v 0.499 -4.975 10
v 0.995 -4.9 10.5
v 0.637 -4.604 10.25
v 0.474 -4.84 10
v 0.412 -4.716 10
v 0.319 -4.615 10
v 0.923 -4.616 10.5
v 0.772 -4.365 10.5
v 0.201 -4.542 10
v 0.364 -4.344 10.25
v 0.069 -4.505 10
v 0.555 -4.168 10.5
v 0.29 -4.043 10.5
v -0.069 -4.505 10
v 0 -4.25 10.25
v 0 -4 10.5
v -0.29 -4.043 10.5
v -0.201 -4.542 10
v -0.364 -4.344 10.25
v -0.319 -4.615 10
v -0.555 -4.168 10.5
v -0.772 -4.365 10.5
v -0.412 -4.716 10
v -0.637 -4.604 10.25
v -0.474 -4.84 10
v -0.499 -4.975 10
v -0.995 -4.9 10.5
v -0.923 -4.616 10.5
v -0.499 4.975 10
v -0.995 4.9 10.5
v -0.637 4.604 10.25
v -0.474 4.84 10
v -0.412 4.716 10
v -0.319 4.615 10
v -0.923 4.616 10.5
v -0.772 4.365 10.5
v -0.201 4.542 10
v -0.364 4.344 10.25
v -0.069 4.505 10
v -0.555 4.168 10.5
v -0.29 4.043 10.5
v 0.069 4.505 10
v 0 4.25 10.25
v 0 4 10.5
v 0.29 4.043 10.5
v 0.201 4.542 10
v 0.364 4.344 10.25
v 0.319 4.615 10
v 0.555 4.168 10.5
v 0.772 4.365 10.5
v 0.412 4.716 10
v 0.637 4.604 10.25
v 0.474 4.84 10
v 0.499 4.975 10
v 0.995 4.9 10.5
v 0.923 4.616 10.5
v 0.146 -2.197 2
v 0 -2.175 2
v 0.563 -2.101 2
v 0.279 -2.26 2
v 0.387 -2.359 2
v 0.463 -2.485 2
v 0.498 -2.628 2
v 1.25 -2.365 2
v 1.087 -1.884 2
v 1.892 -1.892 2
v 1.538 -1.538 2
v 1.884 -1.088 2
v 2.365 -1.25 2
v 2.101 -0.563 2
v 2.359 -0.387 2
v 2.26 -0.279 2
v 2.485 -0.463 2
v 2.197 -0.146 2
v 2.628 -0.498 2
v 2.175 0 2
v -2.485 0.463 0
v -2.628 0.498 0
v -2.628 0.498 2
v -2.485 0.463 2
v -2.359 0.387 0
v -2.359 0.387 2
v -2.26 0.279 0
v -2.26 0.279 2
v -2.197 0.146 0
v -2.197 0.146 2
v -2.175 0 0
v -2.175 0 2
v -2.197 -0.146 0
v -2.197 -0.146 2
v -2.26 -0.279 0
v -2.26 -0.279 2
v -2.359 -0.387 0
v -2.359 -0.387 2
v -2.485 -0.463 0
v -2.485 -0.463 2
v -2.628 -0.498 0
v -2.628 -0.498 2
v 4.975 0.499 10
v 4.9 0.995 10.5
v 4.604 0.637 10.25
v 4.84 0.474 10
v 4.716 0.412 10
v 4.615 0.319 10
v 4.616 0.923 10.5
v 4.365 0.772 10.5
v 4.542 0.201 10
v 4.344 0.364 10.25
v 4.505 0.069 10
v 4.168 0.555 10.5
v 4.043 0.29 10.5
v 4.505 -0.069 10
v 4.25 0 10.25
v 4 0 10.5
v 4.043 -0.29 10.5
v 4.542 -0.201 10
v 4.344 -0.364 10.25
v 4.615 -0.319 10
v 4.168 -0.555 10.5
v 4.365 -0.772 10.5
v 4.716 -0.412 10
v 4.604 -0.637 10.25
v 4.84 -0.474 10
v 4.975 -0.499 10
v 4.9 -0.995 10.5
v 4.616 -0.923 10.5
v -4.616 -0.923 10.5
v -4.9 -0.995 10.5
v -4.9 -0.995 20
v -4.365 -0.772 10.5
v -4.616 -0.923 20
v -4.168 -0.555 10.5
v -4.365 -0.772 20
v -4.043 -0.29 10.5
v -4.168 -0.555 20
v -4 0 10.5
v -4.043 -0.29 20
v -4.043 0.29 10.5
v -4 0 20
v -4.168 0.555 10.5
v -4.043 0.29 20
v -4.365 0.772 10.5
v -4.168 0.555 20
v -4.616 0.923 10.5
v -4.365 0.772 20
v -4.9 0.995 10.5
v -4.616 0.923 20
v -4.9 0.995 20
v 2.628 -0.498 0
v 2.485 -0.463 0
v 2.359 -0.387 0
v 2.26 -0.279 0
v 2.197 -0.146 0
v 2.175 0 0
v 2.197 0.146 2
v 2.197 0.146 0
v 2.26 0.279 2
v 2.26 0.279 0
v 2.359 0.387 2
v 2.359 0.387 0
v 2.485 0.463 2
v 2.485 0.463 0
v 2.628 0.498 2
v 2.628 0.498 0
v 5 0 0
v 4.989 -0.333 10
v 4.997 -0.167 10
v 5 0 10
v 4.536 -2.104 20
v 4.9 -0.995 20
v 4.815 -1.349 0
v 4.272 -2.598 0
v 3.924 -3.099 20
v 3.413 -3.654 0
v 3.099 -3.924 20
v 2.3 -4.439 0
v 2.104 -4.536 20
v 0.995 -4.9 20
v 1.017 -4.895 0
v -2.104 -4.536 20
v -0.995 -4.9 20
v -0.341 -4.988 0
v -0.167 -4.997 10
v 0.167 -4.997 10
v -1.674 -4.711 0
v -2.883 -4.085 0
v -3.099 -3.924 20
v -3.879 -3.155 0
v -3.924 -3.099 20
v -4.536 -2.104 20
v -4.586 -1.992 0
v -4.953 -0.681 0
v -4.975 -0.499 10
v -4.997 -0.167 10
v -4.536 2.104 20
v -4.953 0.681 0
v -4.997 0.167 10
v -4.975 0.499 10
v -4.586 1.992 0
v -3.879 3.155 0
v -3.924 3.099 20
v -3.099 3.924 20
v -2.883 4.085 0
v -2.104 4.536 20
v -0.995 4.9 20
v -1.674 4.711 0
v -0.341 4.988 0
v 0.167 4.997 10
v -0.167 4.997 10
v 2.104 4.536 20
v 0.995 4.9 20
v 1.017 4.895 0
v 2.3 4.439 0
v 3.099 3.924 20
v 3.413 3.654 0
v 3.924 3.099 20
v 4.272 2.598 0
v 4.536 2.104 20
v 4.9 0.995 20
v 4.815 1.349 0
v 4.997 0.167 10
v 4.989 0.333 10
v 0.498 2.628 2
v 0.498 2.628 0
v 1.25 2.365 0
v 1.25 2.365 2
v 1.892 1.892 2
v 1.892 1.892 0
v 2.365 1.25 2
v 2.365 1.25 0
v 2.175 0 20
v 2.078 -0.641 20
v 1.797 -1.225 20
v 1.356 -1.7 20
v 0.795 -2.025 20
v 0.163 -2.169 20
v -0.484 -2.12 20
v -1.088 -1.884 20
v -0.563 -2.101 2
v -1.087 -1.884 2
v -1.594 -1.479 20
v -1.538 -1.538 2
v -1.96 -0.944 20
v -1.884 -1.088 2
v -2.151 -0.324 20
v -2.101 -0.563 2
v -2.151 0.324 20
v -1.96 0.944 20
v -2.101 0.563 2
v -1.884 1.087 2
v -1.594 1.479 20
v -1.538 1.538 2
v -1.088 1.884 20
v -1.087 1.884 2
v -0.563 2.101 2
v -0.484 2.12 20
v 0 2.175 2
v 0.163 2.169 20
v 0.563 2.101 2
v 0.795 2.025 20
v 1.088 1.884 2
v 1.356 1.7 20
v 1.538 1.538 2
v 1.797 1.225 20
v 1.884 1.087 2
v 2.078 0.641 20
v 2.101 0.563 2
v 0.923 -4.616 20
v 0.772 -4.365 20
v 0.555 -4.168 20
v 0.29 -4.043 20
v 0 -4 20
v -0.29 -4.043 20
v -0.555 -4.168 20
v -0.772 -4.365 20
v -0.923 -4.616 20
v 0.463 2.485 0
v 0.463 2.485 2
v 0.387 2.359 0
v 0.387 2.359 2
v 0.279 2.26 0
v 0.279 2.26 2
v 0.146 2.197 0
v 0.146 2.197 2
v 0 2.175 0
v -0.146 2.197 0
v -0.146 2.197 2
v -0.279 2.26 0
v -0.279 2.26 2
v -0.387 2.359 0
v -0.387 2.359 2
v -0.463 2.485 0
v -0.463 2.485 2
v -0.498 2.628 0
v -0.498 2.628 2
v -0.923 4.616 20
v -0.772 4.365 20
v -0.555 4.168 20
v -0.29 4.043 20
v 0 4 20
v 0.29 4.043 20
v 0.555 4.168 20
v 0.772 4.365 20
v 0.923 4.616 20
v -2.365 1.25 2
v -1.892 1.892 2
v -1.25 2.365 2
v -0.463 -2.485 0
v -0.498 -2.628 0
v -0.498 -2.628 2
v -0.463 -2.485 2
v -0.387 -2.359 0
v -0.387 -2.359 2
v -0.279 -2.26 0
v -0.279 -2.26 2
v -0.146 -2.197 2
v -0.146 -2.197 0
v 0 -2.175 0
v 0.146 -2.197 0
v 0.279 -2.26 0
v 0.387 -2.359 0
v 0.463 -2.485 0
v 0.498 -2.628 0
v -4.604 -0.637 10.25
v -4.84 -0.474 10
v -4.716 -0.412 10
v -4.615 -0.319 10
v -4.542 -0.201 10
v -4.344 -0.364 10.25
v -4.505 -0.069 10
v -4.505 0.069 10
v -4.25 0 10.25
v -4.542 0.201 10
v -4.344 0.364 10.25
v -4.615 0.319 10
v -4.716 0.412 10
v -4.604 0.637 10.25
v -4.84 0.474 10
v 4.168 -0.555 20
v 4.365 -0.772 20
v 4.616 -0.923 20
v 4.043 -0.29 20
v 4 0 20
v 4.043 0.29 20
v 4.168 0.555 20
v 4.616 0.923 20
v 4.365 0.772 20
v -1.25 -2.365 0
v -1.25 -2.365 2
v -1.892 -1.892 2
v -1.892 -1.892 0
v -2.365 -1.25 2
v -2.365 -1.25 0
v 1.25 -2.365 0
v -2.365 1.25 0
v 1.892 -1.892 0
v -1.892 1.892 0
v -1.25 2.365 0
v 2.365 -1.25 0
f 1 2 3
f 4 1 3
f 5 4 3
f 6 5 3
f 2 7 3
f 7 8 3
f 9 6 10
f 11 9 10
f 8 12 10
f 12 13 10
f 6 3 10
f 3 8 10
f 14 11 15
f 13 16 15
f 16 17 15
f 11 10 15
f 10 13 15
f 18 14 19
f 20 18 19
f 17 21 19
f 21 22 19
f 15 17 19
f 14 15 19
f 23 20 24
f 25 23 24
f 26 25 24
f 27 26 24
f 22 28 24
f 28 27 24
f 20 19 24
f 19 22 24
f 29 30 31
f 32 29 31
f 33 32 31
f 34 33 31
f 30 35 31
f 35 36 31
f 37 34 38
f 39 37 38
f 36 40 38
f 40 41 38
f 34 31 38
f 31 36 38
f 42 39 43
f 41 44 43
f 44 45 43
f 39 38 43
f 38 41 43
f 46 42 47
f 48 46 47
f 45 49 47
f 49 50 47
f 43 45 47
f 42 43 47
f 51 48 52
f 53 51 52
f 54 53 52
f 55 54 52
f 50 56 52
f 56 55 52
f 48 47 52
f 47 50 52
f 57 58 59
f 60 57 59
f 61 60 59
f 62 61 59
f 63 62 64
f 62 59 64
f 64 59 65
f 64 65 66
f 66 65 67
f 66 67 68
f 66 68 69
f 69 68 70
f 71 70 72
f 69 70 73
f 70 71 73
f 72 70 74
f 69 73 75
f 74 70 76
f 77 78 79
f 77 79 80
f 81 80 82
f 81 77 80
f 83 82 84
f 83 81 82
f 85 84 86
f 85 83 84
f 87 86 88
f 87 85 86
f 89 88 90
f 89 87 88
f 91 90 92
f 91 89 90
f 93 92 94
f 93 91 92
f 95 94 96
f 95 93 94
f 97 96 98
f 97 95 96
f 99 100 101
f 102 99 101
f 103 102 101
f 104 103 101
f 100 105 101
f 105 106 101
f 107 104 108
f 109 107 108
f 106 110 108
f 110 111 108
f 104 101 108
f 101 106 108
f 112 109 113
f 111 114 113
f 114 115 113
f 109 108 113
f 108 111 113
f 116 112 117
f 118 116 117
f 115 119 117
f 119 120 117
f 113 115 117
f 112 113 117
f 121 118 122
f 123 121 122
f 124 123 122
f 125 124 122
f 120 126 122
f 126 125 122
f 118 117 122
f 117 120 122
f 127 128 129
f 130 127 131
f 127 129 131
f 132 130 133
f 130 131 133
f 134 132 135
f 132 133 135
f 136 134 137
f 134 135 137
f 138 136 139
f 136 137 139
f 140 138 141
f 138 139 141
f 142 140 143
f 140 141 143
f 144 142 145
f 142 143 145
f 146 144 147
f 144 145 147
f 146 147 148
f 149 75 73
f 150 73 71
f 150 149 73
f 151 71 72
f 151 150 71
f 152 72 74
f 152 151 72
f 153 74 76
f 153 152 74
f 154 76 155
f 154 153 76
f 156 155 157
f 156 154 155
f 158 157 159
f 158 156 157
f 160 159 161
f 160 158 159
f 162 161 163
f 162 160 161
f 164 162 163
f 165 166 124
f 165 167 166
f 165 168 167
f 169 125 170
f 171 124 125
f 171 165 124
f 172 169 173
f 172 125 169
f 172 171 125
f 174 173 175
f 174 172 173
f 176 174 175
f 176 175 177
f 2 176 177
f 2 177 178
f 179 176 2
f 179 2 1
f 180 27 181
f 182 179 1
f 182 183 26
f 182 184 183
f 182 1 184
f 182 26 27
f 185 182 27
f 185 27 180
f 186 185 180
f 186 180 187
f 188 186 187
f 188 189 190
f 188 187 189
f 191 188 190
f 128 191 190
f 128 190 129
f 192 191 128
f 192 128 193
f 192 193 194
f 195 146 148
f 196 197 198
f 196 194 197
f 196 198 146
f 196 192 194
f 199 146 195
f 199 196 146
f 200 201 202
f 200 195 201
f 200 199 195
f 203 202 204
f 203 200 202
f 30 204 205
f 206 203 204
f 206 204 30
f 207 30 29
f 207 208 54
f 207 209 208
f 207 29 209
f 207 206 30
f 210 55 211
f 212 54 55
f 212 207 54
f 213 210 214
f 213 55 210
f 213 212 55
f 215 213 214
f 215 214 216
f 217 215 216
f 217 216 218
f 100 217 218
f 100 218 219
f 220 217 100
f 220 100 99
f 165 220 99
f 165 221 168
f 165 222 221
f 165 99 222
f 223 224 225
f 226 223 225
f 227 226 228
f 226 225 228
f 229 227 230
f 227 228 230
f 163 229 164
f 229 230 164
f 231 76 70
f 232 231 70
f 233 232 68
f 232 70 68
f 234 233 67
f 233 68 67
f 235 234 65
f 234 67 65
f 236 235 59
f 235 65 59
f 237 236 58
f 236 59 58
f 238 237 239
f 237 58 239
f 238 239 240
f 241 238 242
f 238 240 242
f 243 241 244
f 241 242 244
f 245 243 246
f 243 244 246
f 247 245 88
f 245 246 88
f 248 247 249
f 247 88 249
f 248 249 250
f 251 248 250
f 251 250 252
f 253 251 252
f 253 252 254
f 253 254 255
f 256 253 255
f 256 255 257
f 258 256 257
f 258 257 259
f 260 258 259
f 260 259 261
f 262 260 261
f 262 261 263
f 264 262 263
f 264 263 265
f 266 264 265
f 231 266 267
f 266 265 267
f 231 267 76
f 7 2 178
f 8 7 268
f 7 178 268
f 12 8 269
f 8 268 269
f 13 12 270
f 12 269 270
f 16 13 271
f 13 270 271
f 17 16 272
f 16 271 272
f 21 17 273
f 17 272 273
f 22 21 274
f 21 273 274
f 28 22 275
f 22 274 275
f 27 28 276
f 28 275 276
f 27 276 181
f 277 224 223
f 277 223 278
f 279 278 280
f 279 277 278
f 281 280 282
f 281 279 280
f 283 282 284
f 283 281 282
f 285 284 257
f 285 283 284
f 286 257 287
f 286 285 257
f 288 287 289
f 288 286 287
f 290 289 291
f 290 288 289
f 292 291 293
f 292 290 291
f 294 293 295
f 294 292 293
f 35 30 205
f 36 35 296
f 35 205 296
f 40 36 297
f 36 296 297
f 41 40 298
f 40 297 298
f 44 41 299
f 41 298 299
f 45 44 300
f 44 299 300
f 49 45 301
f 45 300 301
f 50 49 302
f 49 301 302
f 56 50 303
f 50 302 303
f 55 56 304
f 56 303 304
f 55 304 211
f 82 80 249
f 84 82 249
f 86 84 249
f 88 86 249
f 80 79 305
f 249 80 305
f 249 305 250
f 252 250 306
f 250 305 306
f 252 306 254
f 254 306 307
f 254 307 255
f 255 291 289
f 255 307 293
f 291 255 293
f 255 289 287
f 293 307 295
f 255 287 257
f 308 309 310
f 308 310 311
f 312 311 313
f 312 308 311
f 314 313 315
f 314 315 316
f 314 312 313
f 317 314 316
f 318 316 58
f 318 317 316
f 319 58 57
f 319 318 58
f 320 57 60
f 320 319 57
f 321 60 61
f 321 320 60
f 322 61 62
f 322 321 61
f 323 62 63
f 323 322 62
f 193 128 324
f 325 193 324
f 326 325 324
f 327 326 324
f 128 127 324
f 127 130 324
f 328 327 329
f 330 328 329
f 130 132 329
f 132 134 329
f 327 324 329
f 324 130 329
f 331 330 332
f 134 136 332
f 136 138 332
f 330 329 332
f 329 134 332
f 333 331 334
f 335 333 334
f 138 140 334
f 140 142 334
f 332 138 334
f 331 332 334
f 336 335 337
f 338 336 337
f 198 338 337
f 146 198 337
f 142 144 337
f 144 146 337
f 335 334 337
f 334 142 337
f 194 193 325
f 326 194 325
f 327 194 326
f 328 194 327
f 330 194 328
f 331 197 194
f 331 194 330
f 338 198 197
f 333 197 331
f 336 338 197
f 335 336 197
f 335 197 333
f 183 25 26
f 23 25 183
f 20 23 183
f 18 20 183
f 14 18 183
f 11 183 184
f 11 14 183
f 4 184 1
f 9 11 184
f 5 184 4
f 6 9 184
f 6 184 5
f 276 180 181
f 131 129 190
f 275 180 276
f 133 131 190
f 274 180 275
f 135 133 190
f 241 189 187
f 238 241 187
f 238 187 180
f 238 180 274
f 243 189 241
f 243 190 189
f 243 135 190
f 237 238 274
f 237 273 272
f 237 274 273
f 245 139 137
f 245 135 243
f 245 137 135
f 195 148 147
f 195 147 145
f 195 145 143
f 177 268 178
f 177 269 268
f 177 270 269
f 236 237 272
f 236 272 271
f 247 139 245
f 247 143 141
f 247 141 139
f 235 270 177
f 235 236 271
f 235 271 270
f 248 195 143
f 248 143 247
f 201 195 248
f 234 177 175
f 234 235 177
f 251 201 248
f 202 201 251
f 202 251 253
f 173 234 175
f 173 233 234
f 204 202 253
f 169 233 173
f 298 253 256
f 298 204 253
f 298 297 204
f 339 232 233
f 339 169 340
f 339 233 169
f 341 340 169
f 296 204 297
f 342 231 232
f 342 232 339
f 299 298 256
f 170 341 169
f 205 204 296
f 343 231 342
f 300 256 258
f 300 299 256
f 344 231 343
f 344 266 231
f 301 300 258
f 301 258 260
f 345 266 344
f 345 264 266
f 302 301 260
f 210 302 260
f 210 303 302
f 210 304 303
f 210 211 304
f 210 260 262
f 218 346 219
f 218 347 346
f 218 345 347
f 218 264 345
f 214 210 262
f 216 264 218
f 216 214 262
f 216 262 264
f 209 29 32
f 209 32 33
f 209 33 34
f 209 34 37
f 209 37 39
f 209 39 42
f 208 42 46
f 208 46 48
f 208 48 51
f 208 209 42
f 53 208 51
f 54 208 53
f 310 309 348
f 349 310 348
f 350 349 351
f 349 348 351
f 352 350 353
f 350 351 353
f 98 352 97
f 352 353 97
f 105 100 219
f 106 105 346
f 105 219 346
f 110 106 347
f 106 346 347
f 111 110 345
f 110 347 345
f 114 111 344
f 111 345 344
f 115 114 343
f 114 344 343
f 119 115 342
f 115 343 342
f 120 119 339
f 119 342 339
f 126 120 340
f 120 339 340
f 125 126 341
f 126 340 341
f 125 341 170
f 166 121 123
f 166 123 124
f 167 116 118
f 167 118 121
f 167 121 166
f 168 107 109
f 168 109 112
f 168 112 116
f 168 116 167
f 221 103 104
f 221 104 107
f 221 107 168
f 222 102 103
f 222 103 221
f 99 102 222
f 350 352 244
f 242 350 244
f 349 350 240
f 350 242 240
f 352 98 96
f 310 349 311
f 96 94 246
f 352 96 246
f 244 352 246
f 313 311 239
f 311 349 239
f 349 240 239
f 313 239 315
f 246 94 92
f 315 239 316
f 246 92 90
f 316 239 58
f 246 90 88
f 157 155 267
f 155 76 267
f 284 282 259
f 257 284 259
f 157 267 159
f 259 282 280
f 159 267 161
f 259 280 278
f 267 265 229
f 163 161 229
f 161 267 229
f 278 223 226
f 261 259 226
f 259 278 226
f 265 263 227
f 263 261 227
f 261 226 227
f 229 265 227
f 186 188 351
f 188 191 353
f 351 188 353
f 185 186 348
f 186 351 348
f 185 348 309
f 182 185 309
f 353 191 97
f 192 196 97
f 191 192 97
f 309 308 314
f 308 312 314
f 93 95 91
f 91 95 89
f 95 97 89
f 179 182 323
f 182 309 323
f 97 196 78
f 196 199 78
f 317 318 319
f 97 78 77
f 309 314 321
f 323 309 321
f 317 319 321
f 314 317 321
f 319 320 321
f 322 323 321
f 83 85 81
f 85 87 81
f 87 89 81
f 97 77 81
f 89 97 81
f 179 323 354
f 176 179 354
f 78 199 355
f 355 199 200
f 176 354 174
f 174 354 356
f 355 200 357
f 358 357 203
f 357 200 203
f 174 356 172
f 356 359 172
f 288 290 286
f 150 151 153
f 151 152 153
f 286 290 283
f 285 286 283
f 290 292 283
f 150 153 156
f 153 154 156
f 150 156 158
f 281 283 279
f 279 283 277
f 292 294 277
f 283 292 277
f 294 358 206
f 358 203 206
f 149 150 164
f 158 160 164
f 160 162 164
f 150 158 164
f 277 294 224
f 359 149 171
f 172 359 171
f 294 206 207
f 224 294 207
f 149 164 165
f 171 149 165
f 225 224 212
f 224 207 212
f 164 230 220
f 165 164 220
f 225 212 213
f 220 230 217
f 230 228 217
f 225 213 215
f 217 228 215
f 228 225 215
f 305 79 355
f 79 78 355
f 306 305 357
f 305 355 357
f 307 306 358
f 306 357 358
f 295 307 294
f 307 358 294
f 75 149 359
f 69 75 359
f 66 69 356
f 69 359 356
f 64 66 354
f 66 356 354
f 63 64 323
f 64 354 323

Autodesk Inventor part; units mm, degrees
ref_plane "YZ Plane" through (0, 0, 0) normal (1, 0, 0) x (0, 1, 0)
ref_plane "XZ Plane" through (0, 0, 0) normal (0, 1, 0) x (-1, 0, 0)
ref_plane "XY Plane" through (0, 0, 0) normal (0, 0, 1) x (1, 0, 0)
sketch "Skizze1" plane through (0, 0, 0) normal (0, 0, 1) x (1, 0, 0)
  circle A0 centre (0, 0) radius 2.675
  circle A1 centre (0, 0) radius 5
  dimension "d0" = 5.35
  dimension "d3" = 10
extrude "Extrusion1" add sketch "Skizze1" along normal blind 20
sketch "Skizze2" plane through (0, 0, 0) normal (0, 0, -1) x (-1, 0, 0)
  circle A0 centre (0, 0) radius 2.675 projected
  circle A1 centre (2.675, 0) radius 0.5
  circle A2 centre (0, 2.675) radius 0.5
  circle A3 centre (-2.675, 0) radius 0.5
  circle A4 centre (0, -2.675) radius 0.5
  point P0 (0.4978, -2.6283)
  point P1 (-0.4978, -2.6283)
  point P2 (2.6283, 0.4978)
  point P3 (2.6283, -0.4978)
  point P4 (-0.4978, 2.6283)
  point P5 (0.4978, 2.6283)
  dimension "d4" = 1
  dimension "d7" = 360
extrude "Extrusion2" add sketch "Skizze2" against normal blind 2 contours A0 A1 | A2 A0 | A0 A4 | A3 A0 | A0 A3 picked at (2.5116, 0.0962) picked at (0, 2.5049) picked at (0, -2.5049)
sketch "Skizze3" plane through (0, 0, 2) normal (0, 0, 1) x (1, 0, 0)
  circle A0 centre (0, 0) radius 2.675 projected
  circle A1 centre (0, 0) radius 2.175
  arc A2 (-2.6283, -0.4978) -> (-2.6283, 0.4978) centre (-2.675, 0) ccw projected
extrude "Extrusion3" add sketch "Skizze3" along normal up to surface (18 mm away)
sketch "Skizze4" plane through (0, 0, 20) normal (0, 0, 1) x (1, 0, 0)
  circle A0 centre (0, 0) radius 5 projected
  circle A1 centre (0, -5) radius 1
  circle A2 centre (5, 0) radius 1
  circle A3 centre (0, 5) radius 1
  circle A4 centre (-5, 0) radius 1
  point P0 (-0.995, 4.9)
  point P1 (0.995, 4.9)
  point P2 (4.9, 0.995)
  point P3 (4.9, -0.995)
  point P4 (0.995, -4.9)
  point P5 (-0.995, -4.9)
  point P6 (-4.9, -0.995)
  point P7 (-4.9, 0.995)
  dimension "d28" = 2
  dimension "d31" = 360
extrude "Extrusion4" cut sketch "Skizze4" against normal blind 10 contours A0 A2 | A3 A0 | A0 A1 | A4 A0 picked at (4.6729, -0.1921) picked at (0, 4.6592) picked at (0, -4.6592) picked at (-4.6592, 0)
chamfer "Fase6" distance 0.5 angle 45 4 edges at (0, 4, 10) (4, 0, 10) (0, -4, 10) (-4, 0, 10)
properties part number "Raspberry Pi Camera v.1 Focus Tool"
